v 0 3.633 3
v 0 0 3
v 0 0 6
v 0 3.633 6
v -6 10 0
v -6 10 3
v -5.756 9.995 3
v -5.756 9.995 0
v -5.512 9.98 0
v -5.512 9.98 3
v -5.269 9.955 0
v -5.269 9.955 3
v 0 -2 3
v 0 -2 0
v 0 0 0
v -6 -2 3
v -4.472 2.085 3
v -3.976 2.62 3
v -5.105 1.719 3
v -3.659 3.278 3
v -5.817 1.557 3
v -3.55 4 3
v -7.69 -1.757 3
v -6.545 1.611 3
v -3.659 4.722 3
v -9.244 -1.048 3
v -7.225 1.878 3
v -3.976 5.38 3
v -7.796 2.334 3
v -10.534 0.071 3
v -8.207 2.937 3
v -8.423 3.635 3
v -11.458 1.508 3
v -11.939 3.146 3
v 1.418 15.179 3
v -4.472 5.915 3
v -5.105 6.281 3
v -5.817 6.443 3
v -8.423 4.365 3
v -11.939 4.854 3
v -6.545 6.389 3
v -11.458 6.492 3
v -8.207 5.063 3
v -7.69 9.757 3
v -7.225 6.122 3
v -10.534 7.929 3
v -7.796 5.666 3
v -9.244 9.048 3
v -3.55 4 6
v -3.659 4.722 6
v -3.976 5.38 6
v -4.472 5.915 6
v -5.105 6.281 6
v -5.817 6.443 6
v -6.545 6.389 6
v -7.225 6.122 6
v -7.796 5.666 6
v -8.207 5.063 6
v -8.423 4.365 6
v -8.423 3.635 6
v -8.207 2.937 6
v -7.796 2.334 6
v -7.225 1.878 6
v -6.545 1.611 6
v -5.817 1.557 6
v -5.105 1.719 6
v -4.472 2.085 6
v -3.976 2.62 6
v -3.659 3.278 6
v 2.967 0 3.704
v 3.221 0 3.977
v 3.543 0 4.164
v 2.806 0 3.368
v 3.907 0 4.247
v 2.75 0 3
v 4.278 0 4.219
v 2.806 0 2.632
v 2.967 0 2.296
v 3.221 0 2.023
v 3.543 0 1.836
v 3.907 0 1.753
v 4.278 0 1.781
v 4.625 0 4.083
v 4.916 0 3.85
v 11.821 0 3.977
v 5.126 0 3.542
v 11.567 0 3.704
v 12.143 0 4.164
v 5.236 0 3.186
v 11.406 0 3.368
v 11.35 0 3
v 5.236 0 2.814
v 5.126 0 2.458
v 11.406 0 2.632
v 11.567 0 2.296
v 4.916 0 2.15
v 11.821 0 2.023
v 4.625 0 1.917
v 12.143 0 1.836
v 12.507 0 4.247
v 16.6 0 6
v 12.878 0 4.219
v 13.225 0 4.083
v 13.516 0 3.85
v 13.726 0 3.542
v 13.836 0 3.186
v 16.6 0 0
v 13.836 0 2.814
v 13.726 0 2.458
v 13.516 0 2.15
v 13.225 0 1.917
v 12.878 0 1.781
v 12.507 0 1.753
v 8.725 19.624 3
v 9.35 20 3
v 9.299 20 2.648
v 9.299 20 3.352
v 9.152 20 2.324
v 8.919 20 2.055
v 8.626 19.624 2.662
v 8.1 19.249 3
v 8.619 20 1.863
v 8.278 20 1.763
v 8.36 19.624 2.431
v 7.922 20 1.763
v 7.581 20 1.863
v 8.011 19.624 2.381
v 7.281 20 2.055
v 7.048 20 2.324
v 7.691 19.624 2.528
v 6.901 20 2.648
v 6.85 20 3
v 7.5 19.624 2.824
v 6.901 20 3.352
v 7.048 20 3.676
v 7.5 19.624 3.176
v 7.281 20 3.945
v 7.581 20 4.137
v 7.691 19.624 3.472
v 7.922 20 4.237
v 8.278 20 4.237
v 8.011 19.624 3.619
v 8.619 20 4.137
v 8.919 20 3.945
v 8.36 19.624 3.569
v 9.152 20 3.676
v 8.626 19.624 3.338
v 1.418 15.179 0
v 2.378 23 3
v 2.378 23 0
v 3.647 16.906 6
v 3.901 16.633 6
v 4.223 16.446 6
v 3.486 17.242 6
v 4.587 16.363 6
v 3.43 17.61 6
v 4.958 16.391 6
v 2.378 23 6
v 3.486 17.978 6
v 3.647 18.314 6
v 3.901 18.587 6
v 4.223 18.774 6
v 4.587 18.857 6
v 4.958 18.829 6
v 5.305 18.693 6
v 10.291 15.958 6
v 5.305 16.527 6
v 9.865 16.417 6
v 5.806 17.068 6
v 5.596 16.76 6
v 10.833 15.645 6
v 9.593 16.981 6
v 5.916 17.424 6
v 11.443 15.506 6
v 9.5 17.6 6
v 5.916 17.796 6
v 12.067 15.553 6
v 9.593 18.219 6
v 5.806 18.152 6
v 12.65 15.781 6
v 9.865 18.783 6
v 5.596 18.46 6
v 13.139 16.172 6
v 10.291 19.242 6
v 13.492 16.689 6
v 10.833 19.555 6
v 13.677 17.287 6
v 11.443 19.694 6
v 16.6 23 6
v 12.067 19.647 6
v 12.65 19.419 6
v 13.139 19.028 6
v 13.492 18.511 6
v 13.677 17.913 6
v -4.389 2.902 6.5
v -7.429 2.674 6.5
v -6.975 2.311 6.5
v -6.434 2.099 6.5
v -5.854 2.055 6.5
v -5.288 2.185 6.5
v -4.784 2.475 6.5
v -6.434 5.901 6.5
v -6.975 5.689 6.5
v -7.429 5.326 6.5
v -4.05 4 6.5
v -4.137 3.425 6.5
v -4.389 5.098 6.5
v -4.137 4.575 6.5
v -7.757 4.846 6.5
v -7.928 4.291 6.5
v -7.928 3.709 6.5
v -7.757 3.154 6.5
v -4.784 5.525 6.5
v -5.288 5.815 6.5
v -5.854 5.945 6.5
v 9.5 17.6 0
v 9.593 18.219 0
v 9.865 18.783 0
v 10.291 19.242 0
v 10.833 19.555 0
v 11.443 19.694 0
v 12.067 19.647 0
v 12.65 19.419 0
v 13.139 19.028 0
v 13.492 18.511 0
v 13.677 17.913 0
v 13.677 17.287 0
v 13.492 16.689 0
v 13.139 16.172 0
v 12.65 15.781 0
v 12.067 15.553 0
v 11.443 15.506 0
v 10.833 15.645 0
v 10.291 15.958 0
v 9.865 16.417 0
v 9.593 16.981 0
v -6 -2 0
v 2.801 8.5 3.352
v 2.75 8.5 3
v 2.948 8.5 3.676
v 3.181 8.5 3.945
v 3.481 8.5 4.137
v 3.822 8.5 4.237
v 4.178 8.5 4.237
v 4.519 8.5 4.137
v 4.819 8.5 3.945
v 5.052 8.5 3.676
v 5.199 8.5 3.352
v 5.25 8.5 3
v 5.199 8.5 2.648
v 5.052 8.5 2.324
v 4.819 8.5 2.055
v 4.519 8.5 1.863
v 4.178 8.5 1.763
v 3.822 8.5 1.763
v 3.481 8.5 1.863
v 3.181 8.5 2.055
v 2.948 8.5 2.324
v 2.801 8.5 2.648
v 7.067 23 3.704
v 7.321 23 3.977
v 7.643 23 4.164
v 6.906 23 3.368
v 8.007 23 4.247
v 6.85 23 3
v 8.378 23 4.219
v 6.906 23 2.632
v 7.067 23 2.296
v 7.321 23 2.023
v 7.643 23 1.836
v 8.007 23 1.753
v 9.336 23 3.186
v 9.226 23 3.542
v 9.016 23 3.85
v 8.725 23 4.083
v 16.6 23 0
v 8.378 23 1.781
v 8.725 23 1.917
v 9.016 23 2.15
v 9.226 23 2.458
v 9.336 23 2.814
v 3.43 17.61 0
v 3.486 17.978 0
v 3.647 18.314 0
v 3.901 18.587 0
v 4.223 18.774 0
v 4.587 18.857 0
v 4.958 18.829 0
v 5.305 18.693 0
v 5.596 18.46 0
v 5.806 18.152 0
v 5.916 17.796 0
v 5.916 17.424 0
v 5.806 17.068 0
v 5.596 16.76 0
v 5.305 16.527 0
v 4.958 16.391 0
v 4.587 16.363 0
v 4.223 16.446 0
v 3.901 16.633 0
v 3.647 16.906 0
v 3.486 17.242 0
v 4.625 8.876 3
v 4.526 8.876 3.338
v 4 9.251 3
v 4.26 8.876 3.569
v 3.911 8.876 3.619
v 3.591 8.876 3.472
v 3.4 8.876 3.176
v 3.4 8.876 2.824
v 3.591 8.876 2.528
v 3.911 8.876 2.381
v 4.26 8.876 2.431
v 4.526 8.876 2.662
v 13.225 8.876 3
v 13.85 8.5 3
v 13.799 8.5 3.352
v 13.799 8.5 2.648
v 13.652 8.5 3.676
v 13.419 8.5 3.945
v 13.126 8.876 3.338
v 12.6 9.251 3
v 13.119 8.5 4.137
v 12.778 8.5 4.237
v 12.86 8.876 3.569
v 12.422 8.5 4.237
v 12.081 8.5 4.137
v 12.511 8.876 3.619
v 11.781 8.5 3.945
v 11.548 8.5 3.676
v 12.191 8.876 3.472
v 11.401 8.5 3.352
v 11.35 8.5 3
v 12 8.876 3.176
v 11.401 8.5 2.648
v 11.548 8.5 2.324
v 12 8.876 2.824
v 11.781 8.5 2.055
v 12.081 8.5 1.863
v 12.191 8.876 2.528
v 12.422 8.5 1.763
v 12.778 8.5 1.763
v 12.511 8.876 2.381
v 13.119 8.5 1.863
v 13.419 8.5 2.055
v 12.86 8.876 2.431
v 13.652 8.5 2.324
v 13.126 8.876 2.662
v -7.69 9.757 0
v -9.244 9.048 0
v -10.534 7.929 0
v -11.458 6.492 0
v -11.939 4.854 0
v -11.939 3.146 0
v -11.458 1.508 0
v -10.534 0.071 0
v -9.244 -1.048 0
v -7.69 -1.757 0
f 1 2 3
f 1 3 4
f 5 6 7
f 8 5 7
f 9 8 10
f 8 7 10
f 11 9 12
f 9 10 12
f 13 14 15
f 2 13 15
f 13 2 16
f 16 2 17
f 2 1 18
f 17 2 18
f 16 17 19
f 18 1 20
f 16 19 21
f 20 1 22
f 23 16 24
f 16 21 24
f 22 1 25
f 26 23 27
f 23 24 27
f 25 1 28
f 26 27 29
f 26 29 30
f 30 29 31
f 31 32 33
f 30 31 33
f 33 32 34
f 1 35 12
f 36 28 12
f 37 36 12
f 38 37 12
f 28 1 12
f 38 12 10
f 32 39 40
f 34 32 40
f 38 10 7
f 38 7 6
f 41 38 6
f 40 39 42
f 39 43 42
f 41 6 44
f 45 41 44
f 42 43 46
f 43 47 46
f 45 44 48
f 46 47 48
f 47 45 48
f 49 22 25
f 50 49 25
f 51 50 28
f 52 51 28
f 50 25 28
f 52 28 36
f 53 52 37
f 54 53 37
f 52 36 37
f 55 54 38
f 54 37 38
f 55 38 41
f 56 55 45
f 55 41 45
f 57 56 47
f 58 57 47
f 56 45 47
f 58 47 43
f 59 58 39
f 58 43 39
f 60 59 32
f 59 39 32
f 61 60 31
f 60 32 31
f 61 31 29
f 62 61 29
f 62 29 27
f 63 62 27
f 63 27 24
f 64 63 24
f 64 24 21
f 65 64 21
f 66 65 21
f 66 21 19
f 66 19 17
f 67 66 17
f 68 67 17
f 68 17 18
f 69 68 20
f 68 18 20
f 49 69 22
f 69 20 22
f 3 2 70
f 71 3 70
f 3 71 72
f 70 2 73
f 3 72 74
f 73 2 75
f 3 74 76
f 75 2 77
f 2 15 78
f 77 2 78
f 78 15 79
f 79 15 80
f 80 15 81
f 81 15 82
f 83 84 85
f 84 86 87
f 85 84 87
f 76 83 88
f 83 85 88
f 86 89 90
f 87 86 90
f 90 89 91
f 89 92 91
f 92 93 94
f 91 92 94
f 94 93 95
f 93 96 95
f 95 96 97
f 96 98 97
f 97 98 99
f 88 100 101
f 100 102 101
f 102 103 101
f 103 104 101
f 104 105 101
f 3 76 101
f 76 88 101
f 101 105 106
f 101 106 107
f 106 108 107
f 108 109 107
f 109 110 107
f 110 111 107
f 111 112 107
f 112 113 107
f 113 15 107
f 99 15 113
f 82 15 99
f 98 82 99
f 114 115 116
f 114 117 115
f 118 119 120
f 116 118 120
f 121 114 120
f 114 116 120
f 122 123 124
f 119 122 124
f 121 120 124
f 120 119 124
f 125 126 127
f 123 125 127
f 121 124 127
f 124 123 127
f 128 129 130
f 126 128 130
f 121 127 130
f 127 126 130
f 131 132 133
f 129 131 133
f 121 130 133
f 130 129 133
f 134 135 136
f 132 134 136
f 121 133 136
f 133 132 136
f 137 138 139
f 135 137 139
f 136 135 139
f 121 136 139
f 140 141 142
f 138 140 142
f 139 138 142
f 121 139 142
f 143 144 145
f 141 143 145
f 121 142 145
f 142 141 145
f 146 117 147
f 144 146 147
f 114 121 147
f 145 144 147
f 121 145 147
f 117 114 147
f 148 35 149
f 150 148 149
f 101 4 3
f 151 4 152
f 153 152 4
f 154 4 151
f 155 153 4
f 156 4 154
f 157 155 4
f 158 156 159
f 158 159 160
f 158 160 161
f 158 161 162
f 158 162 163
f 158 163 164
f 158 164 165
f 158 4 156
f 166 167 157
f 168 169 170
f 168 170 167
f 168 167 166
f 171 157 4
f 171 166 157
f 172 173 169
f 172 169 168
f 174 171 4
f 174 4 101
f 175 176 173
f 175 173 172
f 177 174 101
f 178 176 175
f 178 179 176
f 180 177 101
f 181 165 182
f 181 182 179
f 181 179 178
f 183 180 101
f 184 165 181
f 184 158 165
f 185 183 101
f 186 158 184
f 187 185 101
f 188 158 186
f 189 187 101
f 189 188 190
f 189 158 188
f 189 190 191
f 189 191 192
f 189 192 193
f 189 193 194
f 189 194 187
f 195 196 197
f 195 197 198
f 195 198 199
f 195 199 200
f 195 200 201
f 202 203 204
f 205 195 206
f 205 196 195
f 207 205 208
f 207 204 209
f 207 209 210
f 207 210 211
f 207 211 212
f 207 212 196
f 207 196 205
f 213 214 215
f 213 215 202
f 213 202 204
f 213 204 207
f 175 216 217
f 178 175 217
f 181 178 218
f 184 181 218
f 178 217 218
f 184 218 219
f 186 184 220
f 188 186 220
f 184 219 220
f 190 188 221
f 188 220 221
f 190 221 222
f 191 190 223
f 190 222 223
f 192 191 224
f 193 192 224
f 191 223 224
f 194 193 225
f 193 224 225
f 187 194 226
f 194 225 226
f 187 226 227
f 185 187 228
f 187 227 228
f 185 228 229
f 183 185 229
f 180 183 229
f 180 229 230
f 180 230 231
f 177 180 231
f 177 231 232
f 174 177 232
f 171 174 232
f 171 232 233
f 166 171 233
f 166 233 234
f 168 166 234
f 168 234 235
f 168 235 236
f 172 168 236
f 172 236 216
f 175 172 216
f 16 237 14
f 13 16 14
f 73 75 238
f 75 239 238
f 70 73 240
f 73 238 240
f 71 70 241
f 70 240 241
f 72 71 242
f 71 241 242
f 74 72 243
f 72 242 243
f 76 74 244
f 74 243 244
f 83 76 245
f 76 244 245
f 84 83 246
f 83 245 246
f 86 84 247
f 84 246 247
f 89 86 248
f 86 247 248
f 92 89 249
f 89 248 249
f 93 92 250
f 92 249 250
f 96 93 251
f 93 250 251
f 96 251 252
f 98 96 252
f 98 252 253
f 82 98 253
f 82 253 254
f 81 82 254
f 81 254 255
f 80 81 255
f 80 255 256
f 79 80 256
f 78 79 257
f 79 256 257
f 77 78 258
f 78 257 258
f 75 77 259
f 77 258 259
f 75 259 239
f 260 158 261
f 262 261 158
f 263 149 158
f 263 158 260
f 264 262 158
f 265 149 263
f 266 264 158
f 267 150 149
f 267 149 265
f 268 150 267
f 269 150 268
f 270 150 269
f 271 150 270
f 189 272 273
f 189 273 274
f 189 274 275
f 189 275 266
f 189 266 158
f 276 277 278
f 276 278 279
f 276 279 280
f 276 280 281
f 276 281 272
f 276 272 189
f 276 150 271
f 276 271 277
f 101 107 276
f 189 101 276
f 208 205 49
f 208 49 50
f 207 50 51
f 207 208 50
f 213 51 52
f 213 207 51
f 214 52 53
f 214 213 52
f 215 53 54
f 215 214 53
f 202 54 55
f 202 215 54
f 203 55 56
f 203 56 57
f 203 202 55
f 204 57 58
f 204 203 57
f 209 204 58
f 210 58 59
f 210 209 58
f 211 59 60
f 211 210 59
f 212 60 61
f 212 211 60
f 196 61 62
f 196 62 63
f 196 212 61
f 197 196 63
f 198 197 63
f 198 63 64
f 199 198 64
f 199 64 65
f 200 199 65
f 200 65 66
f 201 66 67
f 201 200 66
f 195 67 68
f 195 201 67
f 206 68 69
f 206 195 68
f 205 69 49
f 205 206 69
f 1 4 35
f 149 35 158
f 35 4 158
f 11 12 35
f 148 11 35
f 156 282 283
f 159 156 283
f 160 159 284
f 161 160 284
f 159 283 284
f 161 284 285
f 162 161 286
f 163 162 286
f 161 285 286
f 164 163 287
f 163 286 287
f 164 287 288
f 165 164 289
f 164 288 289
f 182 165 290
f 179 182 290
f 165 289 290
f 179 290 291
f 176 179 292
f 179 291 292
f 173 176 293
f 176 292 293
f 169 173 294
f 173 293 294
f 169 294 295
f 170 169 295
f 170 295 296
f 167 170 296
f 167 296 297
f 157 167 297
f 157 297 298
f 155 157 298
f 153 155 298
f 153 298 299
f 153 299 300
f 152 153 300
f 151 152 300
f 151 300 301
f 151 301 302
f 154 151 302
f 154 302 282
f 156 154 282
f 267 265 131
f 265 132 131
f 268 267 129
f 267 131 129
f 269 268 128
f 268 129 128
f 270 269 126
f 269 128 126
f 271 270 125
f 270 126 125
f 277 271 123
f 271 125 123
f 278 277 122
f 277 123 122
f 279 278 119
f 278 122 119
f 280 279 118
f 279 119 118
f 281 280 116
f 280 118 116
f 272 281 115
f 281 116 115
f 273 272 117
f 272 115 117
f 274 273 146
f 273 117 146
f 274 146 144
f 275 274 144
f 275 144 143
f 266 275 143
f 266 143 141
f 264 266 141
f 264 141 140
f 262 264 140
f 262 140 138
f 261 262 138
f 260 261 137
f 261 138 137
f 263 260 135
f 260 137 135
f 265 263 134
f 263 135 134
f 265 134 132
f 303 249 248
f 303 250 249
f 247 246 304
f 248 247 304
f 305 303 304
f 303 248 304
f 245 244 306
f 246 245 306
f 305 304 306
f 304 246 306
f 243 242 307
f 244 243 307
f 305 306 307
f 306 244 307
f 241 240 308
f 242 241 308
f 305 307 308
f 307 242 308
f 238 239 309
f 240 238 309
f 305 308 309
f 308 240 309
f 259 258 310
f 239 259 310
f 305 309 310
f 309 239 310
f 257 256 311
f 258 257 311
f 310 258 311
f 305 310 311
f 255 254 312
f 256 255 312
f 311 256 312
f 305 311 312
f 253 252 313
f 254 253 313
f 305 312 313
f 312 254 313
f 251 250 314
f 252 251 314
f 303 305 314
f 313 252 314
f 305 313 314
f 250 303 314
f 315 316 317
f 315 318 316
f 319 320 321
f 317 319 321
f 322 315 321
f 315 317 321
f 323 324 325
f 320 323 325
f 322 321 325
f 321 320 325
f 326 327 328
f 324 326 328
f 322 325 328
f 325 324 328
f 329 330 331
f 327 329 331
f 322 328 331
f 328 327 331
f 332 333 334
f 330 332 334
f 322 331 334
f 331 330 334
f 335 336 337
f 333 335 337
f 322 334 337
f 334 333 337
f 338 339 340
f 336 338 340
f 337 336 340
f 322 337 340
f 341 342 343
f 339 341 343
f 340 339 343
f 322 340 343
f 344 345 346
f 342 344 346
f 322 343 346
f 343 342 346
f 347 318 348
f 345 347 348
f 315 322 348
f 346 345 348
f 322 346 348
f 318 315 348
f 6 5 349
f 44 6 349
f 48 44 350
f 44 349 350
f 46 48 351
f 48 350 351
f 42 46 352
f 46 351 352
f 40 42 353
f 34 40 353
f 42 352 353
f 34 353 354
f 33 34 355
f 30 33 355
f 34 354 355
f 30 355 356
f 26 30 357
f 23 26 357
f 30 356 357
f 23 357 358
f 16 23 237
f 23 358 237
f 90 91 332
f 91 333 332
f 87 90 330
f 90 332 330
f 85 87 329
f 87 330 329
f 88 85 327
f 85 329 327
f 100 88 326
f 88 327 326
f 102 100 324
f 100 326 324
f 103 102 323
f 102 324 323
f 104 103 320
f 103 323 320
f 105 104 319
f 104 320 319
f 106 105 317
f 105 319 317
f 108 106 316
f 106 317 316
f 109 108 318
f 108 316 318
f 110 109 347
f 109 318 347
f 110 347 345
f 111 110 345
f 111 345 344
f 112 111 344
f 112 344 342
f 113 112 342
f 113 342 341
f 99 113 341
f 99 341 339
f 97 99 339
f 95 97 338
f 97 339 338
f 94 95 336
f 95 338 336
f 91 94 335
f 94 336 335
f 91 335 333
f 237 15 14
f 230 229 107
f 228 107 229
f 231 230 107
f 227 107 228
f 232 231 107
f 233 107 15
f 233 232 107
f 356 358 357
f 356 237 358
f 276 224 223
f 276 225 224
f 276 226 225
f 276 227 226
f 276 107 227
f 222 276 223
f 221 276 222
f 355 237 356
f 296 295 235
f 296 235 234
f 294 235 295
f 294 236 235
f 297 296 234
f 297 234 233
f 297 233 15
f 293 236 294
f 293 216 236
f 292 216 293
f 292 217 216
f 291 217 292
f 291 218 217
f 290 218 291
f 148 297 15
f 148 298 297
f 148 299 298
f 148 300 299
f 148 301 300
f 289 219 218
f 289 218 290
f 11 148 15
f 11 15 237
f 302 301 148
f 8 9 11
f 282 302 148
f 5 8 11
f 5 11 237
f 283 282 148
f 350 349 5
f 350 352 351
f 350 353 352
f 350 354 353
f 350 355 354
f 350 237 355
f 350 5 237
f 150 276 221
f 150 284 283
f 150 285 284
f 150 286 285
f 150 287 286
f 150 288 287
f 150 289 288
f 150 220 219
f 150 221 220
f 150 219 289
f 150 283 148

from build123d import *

# Parameters (mm, degrees)
RESSALTO_EXTRUS_O1_DEPTH      = 3
ESBO_O1_3_W                   = 16.6
ESBO_O1_3_H                   = 23
ESBO_O1_3_R                   = 2
ESBO_O1_3_R_2                 = 0.5
RESSALTO_EXTRUS_O2_DEPTH      = 6
CORTE_EXTRUS_O1_DEPTH         = 3
CORTE_EXTRUS_O2_DEPTH         = 29.522973197
CHANFRO1_SIZE                 = 6
FURO_ROSCADO_DE_M3X0_51_D     = 2.5
FURO_ROSCADO_DE_M3X0_51_DEPTH = 8.5
FURO_ROSCADO_DE_M3X0_51_TIP   = 0.751075774
FURO_ROSCADO_DE_M3X0_52_D     = 2.5
FURO_ROSCADO_DE_M3X0_53_D     = 2.5
FURO_ROSCADO_DE_M3X0_53_DEPTH = 3
FURO_ROSCADO_DE_M3X0_53_TIP   = 0.751075774
ESBO_O18_R                    = 2.45
RESSALTO_EXTRUS_O3_DEPTH      = 3.5
CHANFRO2_SIZE                 = 0.5
FURO_ROSCADO_DE_M5X0_81_D     = 4.2
FURO_ROSCADO_DE_M5X0_81_DEPTH = 14
FURO_ROSCADO_DE_M5X0_81_TIP   = 1.2618073


with BuildPart() as part:
    # Esboço1 → Ressalto-extrusão1 (new body)
    with BuildSketch(Plane.XY):
        with BuildLine():
            Line((0, -2), (0, 0))
            Line((0, 0), (0, 16))
            ThreePointArc((0, 16), (-1.757359313, 11.757359313), (-6, 10))
            ThreePointArc((-6, 10), (-12, 4), (-6, -2))
            Line((-6, -2), (0, -2))
        make_face()
    extrude(amount=RESSALTO_EXTRUS_O1_DEPTH)

    # Esboço1<3> → Ressalto-extrusão2 (add)
    with BuildSketch(Plane.XY):
        with Locations((8.3, 11.5)):
            Rectangle(ESBO_O1_3_W, ESBO_O1_3_H)
        with Locations((11.6, 17.6)):
            Circle(ESBO_O1_3_R, mode=Mode.SUBTRACT)
        with Locations((4.68, 17.61)):
            Circle(ESBO_O1_3_R_2, mode=Mode.SUBTRACT)
    extrude(amount=RESSALTO_EXTRUS_O2_DEPTH)

    # Esboço2 → Corte-extrusão1 (cut)
    with BuildSketch(Plane.XY.offset(6)):
        Polygon((0, 3.633024279), (2.37796561, 23), (0, 23), align=None)
    extrude(amount=-CORTE_EXTRUS_O1_DEPTH, mode=Mode.SUBTRACT)

    # Esboço3 → Corte-extrusão2 (cut, through all)
    with BuildSketch(Plane.XY.offset(3)):
        with BuildLine():
            ThreePointArc((-6, 10), (-5.633708763, 9.988808791), (-5.26878394, 9.95527691))
            Line((-5.26878394, 9.95527691), (0.68649297, 9.224060849))
            Line((0.68649297, 9.224060849), (2.37796561, 23))
            Line((2.37796561, 23), (0, 23))
            Line((0, 23), (0, 16))
            ThreePointArc((0, 16), (-1.757359313, 11.757359313), (-6, 10))
        make_face()
    extrude(amount=-CORTE_EXTRUS_O2_DEPTH, mode=Mode.SUBTRACT)

    # Chanfro1
    # the kernel refuses this chamfer: 6 mm, written as the material it adds along each edge
    with BuildSketch(Plane(origin=(0.68649297, 9.224060849, 3), x_dir=(-0.9955217911555101, 0.09453234015153283, 0), z_dir=(0, 0, -1))) as chanfro1_piece_1:
        Polygon((CHANFRO1_SIZE * 0.999621916911, CHANFRO1_SIZE * 0.0274958766106), (-CHANFRO1_SIZE * 0.0274958766106, CHANFRO1_SIZE * 0.999621916911), (0, 0), align=None)
    extrude(amount=3)

    # Furo roscado de M3x0.51
    with Locations(Plane.XZ):
        with Locations((4, 3), (12.6, 3)):
            Hole(FURO_ROSCADO_DE_M3X0_51_D / 2, depth=FURO_ROSCADO_DE_M3X0_51_DEPTH)
            with Locations((0, 0, -(FURO_ROSCADO_DE_M3X0_51_DEPTH + FURO_ROSCADO_DE_M3X0_51_TIP / 2))):  # 118° drill point
                Cone(0, FURO_ROSCADO_DE_M3X0_51_D / 2, FURO_ROSCADO_DE_M3X0_51_TIP, mode=Mode.SUBTRACT)

    # Furo roscado de M3x0.52 (through all)
    with Locations(Plane.XY.offset(6)):
        with Locations((4.68, 17.61)):
            Hole(FURO_ROSCADO_DE_M3X0_52_D / 2)

    # Furo roscado de M3x0.53
    with Locations(Plane(origin=(0, 23, 0), x_dir=(1, 0, 0), z_dir=(0, 1, 0))):
        with Locations((8.1, -3)):
            Hole(FURO_ROSCADO_DE_M3X0_53_D / 2, depth=FURO_ROSCADO_DE_M3X0_53_DEPTH)
            with Locations((0, 0, -(FURO_ROSCADO_DE_M3X0_53_DEPTH + FURO_ROSCADO_DE_M3X0_53_TIP / 2))):  # 118° drill point
                Cone(0, FURO_ROSCADO_DE_M3X0_53_D / 2, FURO_ROSCADO_DE_M3X0_53_TIP, mode=Mode.SUBTRACT)

    # Esboço18 → Ressalto-extrusão3 (add)
    with BuildSketch(Plane.XY.offset(3)):
        with Locations((-6, 4)):
            Circle(ESBO_O18_R)
    extrude(amount=RESSALTO_EXTRUS_O3_DEPTH)

    # Chanfro2
    chanfro2_edges = [part.edges().sort_by_distance(p)[0] for p in [
        (-8.45, 4, 6.5),
    ]]
    chamfer(chanfro2_edges, length=CHANFRO2_SIZE)

    # Furo roscado de M5x0.81
    with Locations(Plane.XY.offset(6)):
        with Locations((11.6, 17.6)):
            Hole(FURO_ROSCADO_DE_M5X0_81_D / 2, depth=FURO_ROSCADO_DE_M5X0_81_DEPTH)
            with Locations((0, 0, -(FURO_ROSCADO_DE_M5X0_81_DEPTH + FURO_ROSCADO_DE_M5X0_81_TIP / 2))):  # 118° drill point
                Cone(0, FURO_ROSCADO_DE_M5X0_81_D / 2, FURO_ROSCADO_DE_M5X0_81_TIP, mode=Mode.SUBTRACT)


solid = part.part
